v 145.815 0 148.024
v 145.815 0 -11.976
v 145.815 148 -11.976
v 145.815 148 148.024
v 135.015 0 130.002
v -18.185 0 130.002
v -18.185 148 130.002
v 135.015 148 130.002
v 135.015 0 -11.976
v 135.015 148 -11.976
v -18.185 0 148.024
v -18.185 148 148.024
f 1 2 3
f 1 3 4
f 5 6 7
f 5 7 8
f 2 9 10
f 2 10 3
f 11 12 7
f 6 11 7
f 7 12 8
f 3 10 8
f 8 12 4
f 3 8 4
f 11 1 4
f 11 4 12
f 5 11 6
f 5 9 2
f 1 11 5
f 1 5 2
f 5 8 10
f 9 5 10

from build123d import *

# Parameters (mm, degrees)
F1_DEPTH = 148


with BuildPart() as f1:
    # F0 (on Front) → F1 (new body)
    with BuildSketch(Plane.XZ):
        Polygon((145.814923, -11.975734), (145.814923, 148.024266), (135.014689, 70.738161), (135.014689, -11.975734), align=None)
        Polygon((-18.185077, 148.024266), (-18.185077, 130.001514), (135.014689, 130.001514), (135.014689, 70.738161), (145.814923, 148.024266), align=None)
    extrude(amount=-F1_DEPTH)


solid = f1.part
